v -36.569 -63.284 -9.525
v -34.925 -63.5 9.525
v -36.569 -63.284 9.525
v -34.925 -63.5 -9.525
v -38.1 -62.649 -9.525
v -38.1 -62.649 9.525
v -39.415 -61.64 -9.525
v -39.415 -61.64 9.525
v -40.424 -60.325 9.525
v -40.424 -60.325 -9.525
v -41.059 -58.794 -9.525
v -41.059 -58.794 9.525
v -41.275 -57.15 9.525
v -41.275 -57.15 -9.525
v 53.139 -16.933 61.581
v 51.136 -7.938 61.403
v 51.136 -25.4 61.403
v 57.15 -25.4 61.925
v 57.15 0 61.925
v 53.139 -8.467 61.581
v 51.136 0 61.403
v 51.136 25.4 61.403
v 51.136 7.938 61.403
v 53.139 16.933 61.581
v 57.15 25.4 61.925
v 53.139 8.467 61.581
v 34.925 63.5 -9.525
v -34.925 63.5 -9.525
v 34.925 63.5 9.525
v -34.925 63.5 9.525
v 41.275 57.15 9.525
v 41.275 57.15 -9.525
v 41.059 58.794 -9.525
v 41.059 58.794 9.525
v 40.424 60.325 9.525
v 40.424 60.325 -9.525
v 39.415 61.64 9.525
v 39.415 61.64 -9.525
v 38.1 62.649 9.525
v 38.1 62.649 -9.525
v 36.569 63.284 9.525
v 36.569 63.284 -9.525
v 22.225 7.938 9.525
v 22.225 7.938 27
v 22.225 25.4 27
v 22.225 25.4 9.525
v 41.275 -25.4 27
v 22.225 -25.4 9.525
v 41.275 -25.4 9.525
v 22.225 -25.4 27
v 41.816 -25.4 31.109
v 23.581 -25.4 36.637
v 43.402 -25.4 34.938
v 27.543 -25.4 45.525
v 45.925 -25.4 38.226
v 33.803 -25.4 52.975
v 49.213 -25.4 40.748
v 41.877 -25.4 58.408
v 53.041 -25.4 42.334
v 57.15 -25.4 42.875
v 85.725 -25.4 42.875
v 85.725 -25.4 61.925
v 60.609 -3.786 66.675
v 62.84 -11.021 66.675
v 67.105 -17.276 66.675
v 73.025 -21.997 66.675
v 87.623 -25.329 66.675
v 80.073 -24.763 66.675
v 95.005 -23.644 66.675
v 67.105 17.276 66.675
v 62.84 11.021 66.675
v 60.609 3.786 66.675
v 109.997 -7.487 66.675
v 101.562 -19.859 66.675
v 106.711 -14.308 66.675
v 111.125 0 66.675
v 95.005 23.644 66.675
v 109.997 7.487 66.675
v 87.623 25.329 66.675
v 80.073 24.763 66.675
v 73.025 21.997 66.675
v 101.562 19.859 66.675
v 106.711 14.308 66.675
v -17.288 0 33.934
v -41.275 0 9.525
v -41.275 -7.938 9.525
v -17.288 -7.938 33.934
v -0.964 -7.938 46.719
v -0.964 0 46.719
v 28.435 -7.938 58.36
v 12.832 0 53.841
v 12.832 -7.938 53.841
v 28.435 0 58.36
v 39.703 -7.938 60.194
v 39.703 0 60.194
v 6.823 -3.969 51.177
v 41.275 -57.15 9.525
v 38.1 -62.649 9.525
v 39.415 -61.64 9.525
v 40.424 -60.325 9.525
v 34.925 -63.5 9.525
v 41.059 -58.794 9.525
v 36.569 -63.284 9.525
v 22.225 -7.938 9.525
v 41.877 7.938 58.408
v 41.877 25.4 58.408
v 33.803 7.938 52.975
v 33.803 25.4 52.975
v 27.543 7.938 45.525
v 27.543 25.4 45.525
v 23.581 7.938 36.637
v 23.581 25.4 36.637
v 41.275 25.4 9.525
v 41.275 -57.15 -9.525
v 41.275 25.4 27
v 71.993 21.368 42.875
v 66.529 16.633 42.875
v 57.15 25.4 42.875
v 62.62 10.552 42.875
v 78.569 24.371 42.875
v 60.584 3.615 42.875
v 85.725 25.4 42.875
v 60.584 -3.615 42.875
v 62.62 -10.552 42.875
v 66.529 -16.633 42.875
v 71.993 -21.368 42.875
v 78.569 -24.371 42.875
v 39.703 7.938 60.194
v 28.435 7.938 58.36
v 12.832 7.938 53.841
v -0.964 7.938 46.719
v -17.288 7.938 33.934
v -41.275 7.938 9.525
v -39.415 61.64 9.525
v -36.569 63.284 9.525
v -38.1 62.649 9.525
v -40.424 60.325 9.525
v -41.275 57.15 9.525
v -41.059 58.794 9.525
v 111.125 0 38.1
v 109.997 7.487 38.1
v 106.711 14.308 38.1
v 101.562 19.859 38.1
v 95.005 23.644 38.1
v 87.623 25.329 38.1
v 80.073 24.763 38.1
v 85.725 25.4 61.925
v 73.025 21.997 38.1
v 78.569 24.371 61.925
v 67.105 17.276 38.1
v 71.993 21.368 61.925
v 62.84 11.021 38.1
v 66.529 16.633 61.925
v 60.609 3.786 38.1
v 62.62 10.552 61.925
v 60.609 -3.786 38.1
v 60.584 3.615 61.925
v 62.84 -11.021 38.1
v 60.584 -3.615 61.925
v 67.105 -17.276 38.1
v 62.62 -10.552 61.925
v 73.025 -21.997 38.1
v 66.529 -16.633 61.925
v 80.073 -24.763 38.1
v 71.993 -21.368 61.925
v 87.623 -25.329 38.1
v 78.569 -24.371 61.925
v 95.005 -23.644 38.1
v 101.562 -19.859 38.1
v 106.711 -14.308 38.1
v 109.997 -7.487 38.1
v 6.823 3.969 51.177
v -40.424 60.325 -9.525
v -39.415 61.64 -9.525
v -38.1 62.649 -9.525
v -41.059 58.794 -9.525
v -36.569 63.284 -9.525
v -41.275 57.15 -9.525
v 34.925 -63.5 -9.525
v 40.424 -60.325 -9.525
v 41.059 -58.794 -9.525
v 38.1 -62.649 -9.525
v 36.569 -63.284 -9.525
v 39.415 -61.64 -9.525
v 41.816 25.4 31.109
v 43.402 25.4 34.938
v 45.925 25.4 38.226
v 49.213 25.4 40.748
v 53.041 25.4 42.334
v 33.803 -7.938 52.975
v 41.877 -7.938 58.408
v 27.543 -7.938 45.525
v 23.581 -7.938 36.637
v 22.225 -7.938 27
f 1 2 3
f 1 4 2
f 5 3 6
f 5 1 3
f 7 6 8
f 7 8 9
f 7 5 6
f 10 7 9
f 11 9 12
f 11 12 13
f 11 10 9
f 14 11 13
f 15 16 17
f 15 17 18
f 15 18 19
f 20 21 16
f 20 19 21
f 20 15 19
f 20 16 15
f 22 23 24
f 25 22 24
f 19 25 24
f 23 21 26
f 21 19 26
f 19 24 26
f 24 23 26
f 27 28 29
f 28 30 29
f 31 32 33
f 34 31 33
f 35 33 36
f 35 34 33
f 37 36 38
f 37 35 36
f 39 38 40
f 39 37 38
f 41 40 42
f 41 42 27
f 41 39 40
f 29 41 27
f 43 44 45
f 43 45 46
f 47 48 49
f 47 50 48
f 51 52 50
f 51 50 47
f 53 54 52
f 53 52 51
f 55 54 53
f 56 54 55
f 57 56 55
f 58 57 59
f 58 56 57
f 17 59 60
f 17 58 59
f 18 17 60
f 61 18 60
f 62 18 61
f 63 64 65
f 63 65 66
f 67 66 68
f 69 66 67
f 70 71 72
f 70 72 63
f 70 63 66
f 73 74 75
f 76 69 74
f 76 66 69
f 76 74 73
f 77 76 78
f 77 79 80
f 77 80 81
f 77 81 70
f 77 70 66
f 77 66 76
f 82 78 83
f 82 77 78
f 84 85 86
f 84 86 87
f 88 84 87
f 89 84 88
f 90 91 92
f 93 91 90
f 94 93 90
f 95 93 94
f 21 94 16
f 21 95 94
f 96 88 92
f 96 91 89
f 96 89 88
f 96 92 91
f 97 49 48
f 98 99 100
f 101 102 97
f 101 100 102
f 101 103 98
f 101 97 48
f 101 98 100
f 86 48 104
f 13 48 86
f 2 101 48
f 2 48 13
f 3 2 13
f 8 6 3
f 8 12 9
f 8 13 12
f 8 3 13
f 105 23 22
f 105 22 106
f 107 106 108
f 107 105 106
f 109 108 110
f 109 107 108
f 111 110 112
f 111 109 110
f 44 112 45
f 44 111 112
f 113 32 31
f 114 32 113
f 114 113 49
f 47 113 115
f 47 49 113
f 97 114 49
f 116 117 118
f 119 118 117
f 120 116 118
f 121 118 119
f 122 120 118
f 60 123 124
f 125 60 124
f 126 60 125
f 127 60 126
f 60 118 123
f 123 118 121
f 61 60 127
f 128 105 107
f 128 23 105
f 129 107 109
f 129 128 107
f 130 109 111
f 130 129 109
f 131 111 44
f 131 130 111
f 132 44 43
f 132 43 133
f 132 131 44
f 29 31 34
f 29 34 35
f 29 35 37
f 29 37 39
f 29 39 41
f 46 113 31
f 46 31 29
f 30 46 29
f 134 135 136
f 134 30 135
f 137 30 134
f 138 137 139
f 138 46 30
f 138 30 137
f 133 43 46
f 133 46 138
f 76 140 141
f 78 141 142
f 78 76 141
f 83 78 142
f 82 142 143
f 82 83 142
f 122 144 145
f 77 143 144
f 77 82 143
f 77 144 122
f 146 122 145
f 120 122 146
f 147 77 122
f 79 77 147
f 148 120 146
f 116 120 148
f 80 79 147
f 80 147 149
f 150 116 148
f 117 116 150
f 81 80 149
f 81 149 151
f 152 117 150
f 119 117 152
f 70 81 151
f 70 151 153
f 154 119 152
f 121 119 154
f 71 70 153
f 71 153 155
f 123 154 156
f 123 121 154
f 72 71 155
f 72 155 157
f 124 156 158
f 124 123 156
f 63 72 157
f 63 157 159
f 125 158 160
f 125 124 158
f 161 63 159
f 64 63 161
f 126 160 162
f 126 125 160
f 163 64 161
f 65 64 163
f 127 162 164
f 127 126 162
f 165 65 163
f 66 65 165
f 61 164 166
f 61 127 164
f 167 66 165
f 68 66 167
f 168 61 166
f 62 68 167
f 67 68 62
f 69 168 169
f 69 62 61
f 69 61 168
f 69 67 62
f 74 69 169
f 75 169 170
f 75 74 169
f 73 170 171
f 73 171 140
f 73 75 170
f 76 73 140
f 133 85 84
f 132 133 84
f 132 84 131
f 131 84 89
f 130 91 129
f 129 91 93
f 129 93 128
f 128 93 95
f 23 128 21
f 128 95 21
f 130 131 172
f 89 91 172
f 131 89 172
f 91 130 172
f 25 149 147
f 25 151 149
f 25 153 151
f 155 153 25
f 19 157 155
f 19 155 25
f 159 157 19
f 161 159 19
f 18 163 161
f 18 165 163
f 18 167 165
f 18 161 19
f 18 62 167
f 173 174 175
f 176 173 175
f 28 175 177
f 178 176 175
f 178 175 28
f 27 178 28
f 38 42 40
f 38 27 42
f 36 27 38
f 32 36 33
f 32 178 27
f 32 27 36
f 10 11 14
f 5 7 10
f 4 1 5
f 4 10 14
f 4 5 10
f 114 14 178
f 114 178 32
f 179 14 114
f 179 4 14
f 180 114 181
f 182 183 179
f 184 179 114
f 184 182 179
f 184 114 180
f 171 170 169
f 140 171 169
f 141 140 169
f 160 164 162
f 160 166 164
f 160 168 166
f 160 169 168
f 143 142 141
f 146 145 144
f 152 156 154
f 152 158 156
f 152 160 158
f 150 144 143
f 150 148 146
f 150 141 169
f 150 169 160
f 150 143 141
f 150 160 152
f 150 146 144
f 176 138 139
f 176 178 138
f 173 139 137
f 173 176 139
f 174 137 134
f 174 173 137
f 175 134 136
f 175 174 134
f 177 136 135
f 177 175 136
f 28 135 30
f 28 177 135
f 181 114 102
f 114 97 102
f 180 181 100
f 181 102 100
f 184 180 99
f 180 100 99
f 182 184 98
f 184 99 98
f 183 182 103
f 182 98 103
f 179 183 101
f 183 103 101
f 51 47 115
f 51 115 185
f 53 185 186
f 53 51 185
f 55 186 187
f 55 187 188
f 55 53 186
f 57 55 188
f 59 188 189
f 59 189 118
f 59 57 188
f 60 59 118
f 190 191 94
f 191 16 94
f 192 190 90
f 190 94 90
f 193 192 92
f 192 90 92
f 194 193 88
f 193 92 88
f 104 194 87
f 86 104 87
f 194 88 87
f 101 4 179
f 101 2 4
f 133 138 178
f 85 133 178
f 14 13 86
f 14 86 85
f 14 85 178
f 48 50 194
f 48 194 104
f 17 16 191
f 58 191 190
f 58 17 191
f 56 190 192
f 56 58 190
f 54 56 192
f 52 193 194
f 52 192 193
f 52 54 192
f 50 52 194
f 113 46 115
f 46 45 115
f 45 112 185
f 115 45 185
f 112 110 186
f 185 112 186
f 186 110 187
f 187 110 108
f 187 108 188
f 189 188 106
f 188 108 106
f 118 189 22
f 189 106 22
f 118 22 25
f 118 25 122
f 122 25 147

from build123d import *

# Parameters (mm, degrees)
F1_DEPTH = 63.5
F0_W     = 25.4
F0_H     = 19.05
F2_DEPTH = 25.4
F3_DEPTH = 7.9375
F5_R     = 6.35


with BuildPart() as f1:
    # F0 (on Front) → F1 (new body, symmetric)
    with BuildSketch(Plane.XZ):
        Polygon((-41.275, -9.525), (41.275, -9.525), (41.275, 9.525), (22.225, 9.525), (-41.275, 9.525), align=None)
    extrude(amount=F1_DEPTH, both=True)

    # F0 (on Front) → F2 (join, symmetric)
    with BuildSketch(Plane.XZ):
        with BuildLine():
            Line((22.225, 9.525), (41.275, 9.525))
            Line((41.275, 9.525), (41.275, 27.0002))
            ThreePointArc((41.275, 27.0002), (45.9246798487, 38.2255201513), (57.15, 42.8752))
            Line((57.15, 42.8752), (60.325, 42.8752))
            Line((60.325, 42.8752), (60.325, 61.9252))
            Line((60.325, 61.9252), (57.15, 61.9252))
            add(Edge.make_bspline(
                [(51.1356519258, 61.403444647), (53.1387058148, 61.5838940905), (55.1443529074, 61.7545470452), (57.15, 61.9252)],
                knots=[0.9452119778, 0.9452119778, 0.9452119778, 0.9452119778, 1, 1, 1, 1], degree=3))
            ThreePointArc((51.1356519258, 61.403444647), (30.4123231049, 49.4691176253), (22.225, 27.0002))
            Line((22.225, 27.0002), (22.225, 9.525))
        make_face()
        with Locations((73.025, 52.4002)):
            Rectangle(F0_W, F0_H)
    extrude(amount=F2_DEPTH, both=True)

    # F0 (on Front) → F3 (join, symmetric)
    with BuildSketch(Plane.XZ):
        with BuildLine():
            add(Edge.make_bspline(
                [(-41.275, 9.525), (-25.9322609375, 26.0151222158), (1.6123086085, 55.6195700492), (35.8274132624, 60.0243688455), (51.1356519258, 61.403444647)],
                knots=[0, 0, 0, 0, 0.5264972724, 0.9452119778, 0.9452119778, 0.9452119778, 0.9452119778], degree=3))
            Line((-41.275, 9.525), (22.225, 9.525))
            Line((22.225, 9.525), (22.225, 27.0002))
            ThreePointArc((22.225, 27.0002), (30.4123231049, 49.4691176253), (51.1356519258, 61.403444647))
        make_face()
    extrude(amount=F3_DEPTH, both=True)

    # F0 (on Front) → F4 (revolve)
    with BuildSketch(Plane.XZ):
        Polygon((85.725, 61.9252), (85.725, 42.8752), (85.725, 38.1), (111.125, 38.1), (111.125, 66.675), (85.725, 66.675), align=None)
    revolve(axis=Axis((85.725, 0, 52.3875), (0, 0, 1)))

    # F5
    f5_edges = [f1.edges().sort_by_distance(p)[0] for p in [
        (41.275, -63.5, 0),
        (-41.275, -63.5, 0),
        (41.275, 63.5, 0),
        (-41.275, 63.5, 0),
    ]]
    fillet(f5_edges, radius=F5_R)


solid = f1.part
